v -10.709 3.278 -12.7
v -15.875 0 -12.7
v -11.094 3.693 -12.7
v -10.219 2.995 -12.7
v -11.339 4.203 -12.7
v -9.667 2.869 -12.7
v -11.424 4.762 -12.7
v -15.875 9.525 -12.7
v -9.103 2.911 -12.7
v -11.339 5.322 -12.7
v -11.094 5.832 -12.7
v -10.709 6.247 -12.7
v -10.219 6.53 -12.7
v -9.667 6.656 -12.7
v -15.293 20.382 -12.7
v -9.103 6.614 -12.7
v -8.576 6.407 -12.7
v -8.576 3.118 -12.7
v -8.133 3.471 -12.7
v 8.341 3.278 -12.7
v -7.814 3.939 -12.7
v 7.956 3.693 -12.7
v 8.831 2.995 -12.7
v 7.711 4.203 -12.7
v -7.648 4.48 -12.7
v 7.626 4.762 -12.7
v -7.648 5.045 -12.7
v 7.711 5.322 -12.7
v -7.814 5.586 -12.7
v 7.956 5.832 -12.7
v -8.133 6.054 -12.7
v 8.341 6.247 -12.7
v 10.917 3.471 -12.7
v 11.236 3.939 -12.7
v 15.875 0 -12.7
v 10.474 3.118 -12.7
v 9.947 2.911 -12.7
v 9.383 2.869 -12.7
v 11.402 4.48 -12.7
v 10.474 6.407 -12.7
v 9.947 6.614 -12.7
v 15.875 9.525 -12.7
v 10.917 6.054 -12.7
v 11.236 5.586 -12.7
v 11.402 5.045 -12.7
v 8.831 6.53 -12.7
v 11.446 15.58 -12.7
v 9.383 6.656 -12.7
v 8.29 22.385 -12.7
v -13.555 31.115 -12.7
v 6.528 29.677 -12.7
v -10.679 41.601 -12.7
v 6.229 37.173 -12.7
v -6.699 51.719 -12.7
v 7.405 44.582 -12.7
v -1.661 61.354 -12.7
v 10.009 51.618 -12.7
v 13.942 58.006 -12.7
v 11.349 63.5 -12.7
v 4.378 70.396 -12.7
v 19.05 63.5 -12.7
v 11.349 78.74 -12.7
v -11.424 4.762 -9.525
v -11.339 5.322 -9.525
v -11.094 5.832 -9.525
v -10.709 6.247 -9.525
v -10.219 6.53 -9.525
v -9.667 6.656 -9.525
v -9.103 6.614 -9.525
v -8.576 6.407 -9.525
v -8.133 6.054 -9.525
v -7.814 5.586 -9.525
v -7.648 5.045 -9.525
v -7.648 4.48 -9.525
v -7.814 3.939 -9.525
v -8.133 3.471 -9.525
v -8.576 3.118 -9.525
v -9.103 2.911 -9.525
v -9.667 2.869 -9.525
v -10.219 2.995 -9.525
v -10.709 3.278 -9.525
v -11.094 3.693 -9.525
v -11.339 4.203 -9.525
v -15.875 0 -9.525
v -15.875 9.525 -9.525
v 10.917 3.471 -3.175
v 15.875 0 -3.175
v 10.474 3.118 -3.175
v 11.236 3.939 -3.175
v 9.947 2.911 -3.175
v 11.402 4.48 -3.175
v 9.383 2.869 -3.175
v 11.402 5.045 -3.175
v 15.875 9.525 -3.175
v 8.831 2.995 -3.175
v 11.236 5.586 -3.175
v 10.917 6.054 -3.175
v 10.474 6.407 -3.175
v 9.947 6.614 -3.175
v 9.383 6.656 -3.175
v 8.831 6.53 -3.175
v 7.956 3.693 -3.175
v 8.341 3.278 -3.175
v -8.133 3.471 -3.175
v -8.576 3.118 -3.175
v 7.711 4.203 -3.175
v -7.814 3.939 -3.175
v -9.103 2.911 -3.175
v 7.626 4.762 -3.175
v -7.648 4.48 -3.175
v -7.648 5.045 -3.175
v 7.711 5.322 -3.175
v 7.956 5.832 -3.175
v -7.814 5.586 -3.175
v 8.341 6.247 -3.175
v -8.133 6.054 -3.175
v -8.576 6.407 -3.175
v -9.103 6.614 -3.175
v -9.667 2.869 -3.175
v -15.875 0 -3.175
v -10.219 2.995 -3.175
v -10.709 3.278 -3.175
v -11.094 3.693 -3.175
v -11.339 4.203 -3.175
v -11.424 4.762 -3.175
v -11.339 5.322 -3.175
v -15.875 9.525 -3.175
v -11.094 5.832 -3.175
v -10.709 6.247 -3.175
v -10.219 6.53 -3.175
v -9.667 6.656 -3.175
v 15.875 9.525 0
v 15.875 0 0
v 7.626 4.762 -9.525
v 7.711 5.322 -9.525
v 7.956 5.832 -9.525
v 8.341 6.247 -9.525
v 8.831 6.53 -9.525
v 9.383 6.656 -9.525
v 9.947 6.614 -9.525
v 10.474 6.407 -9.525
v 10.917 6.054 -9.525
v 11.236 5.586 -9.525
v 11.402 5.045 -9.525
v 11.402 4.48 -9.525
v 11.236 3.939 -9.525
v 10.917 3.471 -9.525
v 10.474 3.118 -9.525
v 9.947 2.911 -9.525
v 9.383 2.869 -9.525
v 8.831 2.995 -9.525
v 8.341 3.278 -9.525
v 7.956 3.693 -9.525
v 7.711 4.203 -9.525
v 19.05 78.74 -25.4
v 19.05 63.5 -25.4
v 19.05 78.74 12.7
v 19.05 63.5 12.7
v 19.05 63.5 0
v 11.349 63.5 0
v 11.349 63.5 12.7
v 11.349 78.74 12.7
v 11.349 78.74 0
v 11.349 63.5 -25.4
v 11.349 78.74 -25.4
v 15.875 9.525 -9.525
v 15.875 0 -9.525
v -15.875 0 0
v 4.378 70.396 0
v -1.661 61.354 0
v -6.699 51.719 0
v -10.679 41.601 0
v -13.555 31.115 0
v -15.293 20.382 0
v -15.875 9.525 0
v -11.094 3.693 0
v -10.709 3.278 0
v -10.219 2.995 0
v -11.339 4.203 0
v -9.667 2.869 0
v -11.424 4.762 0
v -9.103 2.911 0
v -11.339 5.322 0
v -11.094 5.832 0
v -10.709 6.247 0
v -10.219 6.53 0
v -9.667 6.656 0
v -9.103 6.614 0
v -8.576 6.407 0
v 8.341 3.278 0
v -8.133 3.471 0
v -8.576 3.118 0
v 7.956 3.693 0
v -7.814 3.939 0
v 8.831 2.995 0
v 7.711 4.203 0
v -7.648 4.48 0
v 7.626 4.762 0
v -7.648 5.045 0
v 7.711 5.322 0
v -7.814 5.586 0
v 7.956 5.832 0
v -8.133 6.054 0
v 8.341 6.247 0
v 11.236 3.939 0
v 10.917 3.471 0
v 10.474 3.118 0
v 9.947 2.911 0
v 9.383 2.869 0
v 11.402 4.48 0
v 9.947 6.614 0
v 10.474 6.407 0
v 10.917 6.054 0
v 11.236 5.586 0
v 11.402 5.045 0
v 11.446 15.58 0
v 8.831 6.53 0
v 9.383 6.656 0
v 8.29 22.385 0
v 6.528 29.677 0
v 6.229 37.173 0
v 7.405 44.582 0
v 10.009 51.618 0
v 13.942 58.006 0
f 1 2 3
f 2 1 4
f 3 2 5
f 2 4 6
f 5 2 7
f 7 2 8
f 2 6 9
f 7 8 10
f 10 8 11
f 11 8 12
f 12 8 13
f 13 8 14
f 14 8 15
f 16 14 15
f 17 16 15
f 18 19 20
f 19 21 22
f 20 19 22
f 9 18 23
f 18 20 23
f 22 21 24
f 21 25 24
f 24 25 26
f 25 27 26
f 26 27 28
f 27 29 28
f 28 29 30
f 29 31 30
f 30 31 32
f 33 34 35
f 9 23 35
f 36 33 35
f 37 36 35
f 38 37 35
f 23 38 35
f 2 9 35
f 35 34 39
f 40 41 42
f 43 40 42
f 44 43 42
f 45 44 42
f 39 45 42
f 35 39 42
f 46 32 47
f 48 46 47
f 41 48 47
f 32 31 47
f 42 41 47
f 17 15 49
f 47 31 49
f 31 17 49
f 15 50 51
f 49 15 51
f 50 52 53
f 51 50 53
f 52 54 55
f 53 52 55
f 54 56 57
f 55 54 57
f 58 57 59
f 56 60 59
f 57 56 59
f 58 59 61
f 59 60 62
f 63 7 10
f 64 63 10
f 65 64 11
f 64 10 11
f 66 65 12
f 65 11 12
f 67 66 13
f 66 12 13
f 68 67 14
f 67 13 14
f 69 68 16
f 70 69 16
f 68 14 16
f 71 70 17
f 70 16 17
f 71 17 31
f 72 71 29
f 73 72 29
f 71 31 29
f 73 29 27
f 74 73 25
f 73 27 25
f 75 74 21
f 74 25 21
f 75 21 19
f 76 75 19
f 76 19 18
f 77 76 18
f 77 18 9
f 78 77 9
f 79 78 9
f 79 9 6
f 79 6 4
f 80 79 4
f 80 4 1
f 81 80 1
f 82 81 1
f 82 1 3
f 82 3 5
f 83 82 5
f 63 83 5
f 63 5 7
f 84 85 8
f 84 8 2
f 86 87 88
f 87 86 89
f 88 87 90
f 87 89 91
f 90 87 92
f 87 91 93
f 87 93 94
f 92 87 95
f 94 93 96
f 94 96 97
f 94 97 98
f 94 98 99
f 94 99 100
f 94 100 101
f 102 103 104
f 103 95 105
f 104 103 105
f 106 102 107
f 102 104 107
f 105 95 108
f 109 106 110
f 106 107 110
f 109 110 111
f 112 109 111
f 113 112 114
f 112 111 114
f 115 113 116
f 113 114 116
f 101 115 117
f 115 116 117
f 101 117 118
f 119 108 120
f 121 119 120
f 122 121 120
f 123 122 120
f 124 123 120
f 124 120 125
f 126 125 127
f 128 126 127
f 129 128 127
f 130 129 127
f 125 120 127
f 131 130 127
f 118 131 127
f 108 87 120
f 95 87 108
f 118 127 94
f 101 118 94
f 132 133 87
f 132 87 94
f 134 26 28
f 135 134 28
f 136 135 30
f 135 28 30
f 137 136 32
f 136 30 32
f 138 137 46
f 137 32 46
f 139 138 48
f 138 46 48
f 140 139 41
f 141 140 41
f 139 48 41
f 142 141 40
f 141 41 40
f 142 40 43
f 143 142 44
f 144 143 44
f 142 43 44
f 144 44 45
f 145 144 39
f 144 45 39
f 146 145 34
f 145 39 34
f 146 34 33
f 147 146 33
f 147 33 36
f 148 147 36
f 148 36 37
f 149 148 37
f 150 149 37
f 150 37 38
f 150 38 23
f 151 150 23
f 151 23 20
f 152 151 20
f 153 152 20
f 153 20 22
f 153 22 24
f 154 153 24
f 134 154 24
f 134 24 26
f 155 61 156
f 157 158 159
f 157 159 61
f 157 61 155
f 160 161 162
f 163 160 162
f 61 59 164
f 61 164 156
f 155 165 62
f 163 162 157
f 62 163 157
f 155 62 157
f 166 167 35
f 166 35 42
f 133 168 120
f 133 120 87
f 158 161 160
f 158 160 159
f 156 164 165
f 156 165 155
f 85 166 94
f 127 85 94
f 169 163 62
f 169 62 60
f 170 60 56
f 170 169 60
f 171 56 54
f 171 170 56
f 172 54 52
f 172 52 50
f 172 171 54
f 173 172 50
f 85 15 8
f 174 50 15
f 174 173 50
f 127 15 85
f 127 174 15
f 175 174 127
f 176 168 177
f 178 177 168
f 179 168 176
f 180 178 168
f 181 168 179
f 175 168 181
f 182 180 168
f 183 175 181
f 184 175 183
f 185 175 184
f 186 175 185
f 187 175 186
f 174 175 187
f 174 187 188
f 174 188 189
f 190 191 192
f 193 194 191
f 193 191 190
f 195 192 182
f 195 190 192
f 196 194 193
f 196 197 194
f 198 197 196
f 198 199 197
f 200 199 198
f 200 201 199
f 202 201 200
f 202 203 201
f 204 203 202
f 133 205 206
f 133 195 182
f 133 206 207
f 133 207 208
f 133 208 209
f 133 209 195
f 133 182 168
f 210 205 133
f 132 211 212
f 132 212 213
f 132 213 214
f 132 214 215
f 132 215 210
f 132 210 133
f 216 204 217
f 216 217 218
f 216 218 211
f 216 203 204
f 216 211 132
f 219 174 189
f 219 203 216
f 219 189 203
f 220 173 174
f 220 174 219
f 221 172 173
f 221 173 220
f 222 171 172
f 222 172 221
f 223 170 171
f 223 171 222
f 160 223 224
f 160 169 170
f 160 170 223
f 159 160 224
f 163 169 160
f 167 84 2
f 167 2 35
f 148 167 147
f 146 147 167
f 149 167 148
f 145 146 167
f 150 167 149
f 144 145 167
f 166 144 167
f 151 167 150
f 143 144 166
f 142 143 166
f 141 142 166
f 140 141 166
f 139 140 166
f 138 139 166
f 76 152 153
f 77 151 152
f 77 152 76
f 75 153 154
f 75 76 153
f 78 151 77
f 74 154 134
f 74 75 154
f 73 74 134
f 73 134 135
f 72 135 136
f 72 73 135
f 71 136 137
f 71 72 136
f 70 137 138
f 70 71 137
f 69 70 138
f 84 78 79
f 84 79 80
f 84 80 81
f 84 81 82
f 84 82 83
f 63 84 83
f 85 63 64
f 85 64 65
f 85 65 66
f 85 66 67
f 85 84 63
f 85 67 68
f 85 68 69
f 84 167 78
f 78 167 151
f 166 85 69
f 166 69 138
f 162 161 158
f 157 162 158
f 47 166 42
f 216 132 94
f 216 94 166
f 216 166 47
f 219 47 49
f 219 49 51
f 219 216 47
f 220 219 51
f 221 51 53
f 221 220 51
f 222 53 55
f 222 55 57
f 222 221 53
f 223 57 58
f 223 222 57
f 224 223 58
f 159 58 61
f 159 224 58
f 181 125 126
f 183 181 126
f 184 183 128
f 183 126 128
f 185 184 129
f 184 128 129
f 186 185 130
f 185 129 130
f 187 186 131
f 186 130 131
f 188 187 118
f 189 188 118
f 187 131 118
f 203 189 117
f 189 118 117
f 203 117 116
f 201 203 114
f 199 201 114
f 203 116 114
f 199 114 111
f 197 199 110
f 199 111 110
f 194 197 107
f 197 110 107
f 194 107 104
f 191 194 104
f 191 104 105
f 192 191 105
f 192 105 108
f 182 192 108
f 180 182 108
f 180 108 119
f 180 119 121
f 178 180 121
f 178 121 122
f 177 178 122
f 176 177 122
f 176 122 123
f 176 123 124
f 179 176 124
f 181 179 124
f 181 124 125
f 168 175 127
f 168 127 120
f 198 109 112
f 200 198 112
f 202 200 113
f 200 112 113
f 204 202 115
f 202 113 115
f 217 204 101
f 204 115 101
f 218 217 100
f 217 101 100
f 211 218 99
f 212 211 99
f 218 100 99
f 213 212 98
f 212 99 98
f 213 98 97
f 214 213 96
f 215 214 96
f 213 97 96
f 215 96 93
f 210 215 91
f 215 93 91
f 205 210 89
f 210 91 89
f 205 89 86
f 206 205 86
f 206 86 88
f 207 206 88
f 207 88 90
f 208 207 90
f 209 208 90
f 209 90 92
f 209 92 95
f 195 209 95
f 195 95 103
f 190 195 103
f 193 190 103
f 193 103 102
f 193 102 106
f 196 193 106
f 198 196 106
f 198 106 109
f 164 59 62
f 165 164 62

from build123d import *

# Parameters (mm, degrees)
BOSS_EXTRUDE1_DEPTH   = 12.7
SKETCH5_W             = 6.35
SKETCH5_H             = 9.525
CUT_EXTRUDE1_DEPTH    = 35.925
F_6_CLEARANCE_HOLE1_D = 3.7973
SKETCH9_W             = 7.701365702
SKETCH9_H             = 15.24
BOSS_EXTRUDE2_DEPTH   = 19.05


with BuildPart() as part:
    # Sketch1 → Boss-Extrude1 (new body)
    with BuildSketch(Plane.XY):
        with BuildLine():
            Line((-15.875, 0), (15.875, 0))
            Line((15.875, 0), (15.875, 9.525))
            ThreePointArc((15.875, 9.525), (6.228979432, 37.173295328), (19.05, 63.5))
            Line((19.05, 63.5), (19.05, 78.74))
            Line((19.05, 78.74), (11.348634298, 78.74))
            ThreePointArc((11.348634298, 78.74), (-8.824454666, 46.71317853), (-15.875, 9.525))
            Line((-15.875, 9.525), (-15.875, 0))
        make_face()
    extrude(amount=-BOSS_EXTRUDE1_DEPTH)

    # Sketch5 → Cut-Extrude1 (cut, through all)
    with BuildSketch(Plane.ZY.offset(15.875)):
        with Locations((-6.35, 4.7625)):
            Rectangle(SKETCH5_W, SKETCH5_H)
    extrude(amount=-CUT_EXTRUDE1_DEPTH, mode=Mode.SUBTRACT)

    # #6 Clearance Hole1 (through all)
    with Locations(Plane.XY):
        with Locations((9.525, 4.7625), (-9.525, 4.7625)):
            Hole(F_6_CLEARANCE_HOLE1_D / 2)

    # Sketch9 → Boss-Extrude2 (add, symmetric)
    with BuildSketch(Plane.XY.offset(-6.35)):
        with Locations((15.199317149, 71.12)):
            Rectangle(SKETCH9_W, SKETCH9_H)
    extrude(amount=BOSS_EXTRUDE2_DEPTH, both=True)


solid = part.part
